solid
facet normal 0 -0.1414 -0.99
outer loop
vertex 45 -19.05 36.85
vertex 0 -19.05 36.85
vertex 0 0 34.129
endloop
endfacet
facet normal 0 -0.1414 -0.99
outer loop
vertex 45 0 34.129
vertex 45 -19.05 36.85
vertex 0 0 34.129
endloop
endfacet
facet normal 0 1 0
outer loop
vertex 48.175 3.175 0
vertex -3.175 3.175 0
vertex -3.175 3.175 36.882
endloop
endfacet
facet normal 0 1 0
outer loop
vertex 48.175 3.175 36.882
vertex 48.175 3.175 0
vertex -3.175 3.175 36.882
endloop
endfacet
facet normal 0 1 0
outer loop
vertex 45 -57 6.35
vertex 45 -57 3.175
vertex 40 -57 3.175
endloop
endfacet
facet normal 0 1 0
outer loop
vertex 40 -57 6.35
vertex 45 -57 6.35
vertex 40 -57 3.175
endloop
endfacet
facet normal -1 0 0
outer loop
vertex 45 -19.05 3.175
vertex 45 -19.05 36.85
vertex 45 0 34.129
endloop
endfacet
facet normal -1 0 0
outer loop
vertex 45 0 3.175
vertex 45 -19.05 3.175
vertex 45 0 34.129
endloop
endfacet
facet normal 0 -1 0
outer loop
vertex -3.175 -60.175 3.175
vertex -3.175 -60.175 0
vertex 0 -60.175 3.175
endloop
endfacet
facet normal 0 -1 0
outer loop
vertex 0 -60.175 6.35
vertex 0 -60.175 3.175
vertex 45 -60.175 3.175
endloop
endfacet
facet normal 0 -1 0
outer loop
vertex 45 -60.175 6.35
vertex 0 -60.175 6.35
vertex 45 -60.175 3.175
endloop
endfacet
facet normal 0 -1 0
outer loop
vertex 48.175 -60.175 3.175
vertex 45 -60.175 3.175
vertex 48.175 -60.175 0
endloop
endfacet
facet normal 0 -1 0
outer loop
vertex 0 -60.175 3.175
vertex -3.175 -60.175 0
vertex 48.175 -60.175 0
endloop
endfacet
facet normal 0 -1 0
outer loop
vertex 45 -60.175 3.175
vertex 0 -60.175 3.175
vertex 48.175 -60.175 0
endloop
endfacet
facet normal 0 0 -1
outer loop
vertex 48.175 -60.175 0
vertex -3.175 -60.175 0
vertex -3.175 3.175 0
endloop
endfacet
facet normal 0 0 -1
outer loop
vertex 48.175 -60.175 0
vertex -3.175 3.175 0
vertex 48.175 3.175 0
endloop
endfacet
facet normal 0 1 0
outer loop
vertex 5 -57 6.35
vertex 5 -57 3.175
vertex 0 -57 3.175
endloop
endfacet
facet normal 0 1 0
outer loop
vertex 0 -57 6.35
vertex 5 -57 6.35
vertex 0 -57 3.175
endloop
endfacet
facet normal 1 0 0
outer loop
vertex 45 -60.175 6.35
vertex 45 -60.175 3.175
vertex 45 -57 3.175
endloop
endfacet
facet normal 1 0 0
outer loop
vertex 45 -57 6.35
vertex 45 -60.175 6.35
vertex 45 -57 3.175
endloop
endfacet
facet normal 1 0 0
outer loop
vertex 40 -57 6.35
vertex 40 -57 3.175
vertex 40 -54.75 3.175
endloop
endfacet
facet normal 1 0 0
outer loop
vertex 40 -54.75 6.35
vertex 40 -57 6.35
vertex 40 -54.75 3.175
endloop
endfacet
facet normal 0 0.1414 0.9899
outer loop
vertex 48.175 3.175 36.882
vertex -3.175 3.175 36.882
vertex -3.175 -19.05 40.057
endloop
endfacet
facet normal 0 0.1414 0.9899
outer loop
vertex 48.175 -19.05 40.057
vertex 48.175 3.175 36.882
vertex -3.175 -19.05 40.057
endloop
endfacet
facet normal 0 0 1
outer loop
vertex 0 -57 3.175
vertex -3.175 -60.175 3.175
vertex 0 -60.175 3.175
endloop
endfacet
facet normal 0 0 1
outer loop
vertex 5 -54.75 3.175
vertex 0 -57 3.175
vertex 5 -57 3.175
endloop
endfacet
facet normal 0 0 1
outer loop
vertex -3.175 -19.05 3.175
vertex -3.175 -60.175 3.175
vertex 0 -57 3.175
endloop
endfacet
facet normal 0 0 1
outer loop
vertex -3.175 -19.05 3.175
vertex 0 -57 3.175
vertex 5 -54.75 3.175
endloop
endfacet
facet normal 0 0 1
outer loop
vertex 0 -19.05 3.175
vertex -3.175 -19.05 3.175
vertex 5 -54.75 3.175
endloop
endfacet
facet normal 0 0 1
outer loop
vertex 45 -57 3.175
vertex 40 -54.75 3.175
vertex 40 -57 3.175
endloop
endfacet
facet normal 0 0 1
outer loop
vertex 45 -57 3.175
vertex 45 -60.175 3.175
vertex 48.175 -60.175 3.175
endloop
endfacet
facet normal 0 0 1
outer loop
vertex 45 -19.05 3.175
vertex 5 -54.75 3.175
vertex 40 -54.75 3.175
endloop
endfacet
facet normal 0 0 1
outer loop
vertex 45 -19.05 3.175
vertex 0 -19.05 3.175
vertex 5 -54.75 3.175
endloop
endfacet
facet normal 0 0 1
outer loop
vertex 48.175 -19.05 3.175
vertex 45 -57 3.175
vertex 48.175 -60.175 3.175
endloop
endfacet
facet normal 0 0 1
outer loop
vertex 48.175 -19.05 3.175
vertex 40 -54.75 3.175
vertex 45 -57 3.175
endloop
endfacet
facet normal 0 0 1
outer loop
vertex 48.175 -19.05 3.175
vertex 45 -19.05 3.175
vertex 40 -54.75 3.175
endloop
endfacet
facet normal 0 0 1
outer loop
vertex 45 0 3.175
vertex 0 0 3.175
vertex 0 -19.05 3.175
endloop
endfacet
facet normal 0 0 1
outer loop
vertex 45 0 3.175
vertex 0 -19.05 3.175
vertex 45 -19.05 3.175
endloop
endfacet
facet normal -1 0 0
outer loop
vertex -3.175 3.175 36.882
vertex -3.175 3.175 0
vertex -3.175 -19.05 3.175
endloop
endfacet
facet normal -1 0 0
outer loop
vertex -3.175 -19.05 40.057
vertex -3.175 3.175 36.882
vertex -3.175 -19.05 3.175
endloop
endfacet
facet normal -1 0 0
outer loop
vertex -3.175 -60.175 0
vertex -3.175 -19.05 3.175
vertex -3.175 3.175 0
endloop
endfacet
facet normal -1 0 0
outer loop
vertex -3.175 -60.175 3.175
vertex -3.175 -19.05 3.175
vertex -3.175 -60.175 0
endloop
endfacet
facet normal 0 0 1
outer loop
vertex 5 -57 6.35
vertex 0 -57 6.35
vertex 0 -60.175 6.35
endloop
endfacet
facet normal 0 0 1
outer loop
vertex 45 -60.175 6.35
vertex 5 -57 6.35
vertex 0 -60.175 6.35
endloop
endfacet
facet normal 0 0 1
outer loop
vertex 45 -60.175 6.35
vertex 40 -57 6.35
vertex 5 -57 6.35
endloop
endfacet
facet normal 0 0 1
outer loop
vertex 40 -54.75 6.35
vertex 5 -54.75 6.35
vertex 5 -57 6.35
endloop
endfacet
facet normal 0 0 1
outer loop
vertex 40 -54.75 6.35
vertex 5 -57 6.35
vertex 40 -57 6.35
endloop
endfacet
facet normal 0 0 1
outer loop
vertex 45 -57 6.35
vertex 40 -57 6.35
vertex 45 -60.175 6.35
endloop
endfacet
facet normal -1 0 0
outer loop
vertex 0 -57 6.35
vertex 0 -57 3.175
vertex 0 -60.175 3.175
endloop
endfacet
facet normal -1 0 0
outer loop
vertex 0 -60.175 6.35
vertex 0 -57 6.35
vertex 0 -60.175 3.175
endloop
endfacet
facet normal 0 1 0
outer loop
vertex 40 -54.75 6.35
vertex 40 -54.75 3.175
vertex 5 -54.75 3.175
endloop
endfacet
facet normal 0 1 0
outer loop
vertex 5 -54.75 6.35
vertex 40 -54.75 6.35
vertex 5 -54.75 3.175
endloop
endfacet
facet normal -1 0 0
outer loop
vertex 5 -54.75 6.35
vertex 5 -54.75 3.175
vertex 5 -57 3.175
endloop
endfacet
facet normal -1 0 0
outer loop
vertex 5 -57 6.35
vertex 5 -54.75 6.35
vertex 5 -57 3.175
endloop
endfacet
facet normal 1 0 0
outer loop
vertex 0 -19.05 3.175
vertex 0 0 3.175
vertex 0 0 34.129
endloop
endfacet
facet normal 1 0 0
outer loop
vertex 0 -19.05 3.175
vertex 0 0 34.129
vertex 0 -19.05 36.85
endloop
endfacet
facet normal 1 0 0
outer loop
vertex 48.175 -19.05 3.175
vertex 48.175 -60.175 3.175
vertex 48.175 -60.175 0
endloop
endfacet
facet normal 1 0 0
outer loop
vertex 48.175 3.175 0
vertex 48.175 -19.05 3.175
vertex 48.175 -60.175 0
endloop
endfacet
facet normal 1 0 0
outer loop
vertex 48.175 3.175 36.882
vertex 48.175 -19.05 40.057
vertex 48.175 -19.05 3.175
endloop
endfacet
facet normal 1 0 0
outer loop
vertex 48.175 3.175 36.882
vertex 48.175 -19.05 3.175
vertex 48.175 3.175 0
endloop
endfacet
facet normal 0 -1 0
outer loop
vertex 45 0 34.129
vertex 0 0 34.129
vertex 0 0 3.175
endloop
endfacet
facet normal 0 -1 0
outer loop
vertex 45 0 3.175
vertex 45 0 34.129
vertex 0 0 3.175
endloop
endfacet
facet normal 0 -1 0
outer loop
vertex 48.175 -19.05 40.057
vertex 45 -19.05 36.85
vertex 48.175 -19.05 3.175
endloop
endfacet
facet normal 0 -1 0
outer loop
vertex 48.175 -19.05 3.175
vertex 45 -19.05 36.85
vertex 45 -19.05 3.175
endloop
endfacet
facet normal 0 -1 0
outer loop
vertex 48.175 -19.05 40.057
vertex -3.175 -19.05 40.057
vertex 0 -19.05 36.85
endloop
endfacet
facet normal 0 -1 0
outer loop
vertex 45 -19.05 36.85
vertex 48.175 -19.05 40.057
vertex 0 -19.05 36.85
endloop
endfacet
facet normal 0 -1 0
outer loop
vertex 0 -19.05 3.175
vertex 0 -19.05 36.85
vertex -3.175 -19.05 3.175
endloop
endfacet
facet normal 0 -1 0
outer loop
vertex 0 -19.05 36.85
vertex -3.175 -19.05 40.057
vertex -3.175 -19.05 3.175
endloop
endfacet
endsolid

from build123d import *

# Parameters (mm, degrees)
F0_W      = 51.35
F0_H      = 63.35
F1_DEPTH  = 3.175
F3_DEPTH  = 30.5
F5_DEPTH  = 3.175
F7_DEPTH  = 3.175
F9_DEPTH  = 45
F11_DEPTH = 3.175


with BuildPart() as f1:
    # F0 (on Top) → F1 (new body)
    with BuildSketch(Plane.XY):
        with Locations((22.5, -28.5)):
            Rectangle(F0_W, F0_H)
        Polygon((0, -57), (0, 0), (22.5, 0), (45, 0), (45, -57), (40, -57), (40, -54.75), (22.5, -54.75), (5, -54.75), (5, -57), align=None, mode=Mode.SUBTRACT)
        Polygon((22.5, 0), (0, 0), (0, -57), (5, -57), (5, -54.75), (22.5, -54.75), align=None)
        Polygon((45, 0), (22.5, 0), (22.5, -54.75), (40, -54.75), (40, -57), (45, -57), align=None)
    extrude(amount=F1_DEPTH)

    # F2 (on face) → F3 (join)
    with BuildSketch(Plane.XY.offset(3.175)):
        Polygon((0, -19.05), (0, 0), (22.5, 0), (45, 0), (45, -19.05), (48.175, -19.05), (48.175, 3.175), (-3.175, 3.175), (-3.175, -19.05), align=None)
    extrude(amount=F3_DEPTH)

    # F4 (on face) → F5 (join, through all)
    with BuildSketch(Plane.YZ.offset(48.175)):
        Polygon((-19.05, 36.85), (-19.05, 33.675), (3.175, 33.675), align=None)
        Polygon((-19.05, 40.057234329), (-19.05, 36.85), (3.175, 33.675), (3.175, 36.882234329), align=None)
    extrude(amount=-F5_DEPTH)

    # F6 (on face) → F7 (join, through all)
    with BuildSketch(Plane(origin=(-3.175, 0, 0), x_dir=(0, -1, 0), z_dir=(-1, 0, 0))):
        Polygon((-3.175, 33.675), (19.05, 36.85), (19.05, 40.057234329), (-3.175, 36.882234329), align=None)
        Polygon((-3.175, 33.675), (19.05, 33.675), (19.05, 36.85), align=None)
    extrude(amount=-F7_DEPTH)

    # F8 (on face) → F9 (join, through all)
    with BuildSketch(Plane.YZ):
        Polygon((-19.05, 40.057234329), (-19.05, 36.85), (0, 34.1285714286), (0, 33.675), (3.175, 33.675), (3.175, 36.882234329), align=None)
    extrude(amount=F9_DEPTH)

    # F10 (on face) → F11 (join)
    with BuildSketch(Plane.XY.offset(3.175)):
        Polygon((40, -54.75), (22.5, -54.75), (5, -54.75), (5, -57), (0, -57), (0, -60.175), (45, -60.175), (45, -57), (40, -57), align=None)
    extrude(amount=F11_DEPTH)


solid = f1.part
